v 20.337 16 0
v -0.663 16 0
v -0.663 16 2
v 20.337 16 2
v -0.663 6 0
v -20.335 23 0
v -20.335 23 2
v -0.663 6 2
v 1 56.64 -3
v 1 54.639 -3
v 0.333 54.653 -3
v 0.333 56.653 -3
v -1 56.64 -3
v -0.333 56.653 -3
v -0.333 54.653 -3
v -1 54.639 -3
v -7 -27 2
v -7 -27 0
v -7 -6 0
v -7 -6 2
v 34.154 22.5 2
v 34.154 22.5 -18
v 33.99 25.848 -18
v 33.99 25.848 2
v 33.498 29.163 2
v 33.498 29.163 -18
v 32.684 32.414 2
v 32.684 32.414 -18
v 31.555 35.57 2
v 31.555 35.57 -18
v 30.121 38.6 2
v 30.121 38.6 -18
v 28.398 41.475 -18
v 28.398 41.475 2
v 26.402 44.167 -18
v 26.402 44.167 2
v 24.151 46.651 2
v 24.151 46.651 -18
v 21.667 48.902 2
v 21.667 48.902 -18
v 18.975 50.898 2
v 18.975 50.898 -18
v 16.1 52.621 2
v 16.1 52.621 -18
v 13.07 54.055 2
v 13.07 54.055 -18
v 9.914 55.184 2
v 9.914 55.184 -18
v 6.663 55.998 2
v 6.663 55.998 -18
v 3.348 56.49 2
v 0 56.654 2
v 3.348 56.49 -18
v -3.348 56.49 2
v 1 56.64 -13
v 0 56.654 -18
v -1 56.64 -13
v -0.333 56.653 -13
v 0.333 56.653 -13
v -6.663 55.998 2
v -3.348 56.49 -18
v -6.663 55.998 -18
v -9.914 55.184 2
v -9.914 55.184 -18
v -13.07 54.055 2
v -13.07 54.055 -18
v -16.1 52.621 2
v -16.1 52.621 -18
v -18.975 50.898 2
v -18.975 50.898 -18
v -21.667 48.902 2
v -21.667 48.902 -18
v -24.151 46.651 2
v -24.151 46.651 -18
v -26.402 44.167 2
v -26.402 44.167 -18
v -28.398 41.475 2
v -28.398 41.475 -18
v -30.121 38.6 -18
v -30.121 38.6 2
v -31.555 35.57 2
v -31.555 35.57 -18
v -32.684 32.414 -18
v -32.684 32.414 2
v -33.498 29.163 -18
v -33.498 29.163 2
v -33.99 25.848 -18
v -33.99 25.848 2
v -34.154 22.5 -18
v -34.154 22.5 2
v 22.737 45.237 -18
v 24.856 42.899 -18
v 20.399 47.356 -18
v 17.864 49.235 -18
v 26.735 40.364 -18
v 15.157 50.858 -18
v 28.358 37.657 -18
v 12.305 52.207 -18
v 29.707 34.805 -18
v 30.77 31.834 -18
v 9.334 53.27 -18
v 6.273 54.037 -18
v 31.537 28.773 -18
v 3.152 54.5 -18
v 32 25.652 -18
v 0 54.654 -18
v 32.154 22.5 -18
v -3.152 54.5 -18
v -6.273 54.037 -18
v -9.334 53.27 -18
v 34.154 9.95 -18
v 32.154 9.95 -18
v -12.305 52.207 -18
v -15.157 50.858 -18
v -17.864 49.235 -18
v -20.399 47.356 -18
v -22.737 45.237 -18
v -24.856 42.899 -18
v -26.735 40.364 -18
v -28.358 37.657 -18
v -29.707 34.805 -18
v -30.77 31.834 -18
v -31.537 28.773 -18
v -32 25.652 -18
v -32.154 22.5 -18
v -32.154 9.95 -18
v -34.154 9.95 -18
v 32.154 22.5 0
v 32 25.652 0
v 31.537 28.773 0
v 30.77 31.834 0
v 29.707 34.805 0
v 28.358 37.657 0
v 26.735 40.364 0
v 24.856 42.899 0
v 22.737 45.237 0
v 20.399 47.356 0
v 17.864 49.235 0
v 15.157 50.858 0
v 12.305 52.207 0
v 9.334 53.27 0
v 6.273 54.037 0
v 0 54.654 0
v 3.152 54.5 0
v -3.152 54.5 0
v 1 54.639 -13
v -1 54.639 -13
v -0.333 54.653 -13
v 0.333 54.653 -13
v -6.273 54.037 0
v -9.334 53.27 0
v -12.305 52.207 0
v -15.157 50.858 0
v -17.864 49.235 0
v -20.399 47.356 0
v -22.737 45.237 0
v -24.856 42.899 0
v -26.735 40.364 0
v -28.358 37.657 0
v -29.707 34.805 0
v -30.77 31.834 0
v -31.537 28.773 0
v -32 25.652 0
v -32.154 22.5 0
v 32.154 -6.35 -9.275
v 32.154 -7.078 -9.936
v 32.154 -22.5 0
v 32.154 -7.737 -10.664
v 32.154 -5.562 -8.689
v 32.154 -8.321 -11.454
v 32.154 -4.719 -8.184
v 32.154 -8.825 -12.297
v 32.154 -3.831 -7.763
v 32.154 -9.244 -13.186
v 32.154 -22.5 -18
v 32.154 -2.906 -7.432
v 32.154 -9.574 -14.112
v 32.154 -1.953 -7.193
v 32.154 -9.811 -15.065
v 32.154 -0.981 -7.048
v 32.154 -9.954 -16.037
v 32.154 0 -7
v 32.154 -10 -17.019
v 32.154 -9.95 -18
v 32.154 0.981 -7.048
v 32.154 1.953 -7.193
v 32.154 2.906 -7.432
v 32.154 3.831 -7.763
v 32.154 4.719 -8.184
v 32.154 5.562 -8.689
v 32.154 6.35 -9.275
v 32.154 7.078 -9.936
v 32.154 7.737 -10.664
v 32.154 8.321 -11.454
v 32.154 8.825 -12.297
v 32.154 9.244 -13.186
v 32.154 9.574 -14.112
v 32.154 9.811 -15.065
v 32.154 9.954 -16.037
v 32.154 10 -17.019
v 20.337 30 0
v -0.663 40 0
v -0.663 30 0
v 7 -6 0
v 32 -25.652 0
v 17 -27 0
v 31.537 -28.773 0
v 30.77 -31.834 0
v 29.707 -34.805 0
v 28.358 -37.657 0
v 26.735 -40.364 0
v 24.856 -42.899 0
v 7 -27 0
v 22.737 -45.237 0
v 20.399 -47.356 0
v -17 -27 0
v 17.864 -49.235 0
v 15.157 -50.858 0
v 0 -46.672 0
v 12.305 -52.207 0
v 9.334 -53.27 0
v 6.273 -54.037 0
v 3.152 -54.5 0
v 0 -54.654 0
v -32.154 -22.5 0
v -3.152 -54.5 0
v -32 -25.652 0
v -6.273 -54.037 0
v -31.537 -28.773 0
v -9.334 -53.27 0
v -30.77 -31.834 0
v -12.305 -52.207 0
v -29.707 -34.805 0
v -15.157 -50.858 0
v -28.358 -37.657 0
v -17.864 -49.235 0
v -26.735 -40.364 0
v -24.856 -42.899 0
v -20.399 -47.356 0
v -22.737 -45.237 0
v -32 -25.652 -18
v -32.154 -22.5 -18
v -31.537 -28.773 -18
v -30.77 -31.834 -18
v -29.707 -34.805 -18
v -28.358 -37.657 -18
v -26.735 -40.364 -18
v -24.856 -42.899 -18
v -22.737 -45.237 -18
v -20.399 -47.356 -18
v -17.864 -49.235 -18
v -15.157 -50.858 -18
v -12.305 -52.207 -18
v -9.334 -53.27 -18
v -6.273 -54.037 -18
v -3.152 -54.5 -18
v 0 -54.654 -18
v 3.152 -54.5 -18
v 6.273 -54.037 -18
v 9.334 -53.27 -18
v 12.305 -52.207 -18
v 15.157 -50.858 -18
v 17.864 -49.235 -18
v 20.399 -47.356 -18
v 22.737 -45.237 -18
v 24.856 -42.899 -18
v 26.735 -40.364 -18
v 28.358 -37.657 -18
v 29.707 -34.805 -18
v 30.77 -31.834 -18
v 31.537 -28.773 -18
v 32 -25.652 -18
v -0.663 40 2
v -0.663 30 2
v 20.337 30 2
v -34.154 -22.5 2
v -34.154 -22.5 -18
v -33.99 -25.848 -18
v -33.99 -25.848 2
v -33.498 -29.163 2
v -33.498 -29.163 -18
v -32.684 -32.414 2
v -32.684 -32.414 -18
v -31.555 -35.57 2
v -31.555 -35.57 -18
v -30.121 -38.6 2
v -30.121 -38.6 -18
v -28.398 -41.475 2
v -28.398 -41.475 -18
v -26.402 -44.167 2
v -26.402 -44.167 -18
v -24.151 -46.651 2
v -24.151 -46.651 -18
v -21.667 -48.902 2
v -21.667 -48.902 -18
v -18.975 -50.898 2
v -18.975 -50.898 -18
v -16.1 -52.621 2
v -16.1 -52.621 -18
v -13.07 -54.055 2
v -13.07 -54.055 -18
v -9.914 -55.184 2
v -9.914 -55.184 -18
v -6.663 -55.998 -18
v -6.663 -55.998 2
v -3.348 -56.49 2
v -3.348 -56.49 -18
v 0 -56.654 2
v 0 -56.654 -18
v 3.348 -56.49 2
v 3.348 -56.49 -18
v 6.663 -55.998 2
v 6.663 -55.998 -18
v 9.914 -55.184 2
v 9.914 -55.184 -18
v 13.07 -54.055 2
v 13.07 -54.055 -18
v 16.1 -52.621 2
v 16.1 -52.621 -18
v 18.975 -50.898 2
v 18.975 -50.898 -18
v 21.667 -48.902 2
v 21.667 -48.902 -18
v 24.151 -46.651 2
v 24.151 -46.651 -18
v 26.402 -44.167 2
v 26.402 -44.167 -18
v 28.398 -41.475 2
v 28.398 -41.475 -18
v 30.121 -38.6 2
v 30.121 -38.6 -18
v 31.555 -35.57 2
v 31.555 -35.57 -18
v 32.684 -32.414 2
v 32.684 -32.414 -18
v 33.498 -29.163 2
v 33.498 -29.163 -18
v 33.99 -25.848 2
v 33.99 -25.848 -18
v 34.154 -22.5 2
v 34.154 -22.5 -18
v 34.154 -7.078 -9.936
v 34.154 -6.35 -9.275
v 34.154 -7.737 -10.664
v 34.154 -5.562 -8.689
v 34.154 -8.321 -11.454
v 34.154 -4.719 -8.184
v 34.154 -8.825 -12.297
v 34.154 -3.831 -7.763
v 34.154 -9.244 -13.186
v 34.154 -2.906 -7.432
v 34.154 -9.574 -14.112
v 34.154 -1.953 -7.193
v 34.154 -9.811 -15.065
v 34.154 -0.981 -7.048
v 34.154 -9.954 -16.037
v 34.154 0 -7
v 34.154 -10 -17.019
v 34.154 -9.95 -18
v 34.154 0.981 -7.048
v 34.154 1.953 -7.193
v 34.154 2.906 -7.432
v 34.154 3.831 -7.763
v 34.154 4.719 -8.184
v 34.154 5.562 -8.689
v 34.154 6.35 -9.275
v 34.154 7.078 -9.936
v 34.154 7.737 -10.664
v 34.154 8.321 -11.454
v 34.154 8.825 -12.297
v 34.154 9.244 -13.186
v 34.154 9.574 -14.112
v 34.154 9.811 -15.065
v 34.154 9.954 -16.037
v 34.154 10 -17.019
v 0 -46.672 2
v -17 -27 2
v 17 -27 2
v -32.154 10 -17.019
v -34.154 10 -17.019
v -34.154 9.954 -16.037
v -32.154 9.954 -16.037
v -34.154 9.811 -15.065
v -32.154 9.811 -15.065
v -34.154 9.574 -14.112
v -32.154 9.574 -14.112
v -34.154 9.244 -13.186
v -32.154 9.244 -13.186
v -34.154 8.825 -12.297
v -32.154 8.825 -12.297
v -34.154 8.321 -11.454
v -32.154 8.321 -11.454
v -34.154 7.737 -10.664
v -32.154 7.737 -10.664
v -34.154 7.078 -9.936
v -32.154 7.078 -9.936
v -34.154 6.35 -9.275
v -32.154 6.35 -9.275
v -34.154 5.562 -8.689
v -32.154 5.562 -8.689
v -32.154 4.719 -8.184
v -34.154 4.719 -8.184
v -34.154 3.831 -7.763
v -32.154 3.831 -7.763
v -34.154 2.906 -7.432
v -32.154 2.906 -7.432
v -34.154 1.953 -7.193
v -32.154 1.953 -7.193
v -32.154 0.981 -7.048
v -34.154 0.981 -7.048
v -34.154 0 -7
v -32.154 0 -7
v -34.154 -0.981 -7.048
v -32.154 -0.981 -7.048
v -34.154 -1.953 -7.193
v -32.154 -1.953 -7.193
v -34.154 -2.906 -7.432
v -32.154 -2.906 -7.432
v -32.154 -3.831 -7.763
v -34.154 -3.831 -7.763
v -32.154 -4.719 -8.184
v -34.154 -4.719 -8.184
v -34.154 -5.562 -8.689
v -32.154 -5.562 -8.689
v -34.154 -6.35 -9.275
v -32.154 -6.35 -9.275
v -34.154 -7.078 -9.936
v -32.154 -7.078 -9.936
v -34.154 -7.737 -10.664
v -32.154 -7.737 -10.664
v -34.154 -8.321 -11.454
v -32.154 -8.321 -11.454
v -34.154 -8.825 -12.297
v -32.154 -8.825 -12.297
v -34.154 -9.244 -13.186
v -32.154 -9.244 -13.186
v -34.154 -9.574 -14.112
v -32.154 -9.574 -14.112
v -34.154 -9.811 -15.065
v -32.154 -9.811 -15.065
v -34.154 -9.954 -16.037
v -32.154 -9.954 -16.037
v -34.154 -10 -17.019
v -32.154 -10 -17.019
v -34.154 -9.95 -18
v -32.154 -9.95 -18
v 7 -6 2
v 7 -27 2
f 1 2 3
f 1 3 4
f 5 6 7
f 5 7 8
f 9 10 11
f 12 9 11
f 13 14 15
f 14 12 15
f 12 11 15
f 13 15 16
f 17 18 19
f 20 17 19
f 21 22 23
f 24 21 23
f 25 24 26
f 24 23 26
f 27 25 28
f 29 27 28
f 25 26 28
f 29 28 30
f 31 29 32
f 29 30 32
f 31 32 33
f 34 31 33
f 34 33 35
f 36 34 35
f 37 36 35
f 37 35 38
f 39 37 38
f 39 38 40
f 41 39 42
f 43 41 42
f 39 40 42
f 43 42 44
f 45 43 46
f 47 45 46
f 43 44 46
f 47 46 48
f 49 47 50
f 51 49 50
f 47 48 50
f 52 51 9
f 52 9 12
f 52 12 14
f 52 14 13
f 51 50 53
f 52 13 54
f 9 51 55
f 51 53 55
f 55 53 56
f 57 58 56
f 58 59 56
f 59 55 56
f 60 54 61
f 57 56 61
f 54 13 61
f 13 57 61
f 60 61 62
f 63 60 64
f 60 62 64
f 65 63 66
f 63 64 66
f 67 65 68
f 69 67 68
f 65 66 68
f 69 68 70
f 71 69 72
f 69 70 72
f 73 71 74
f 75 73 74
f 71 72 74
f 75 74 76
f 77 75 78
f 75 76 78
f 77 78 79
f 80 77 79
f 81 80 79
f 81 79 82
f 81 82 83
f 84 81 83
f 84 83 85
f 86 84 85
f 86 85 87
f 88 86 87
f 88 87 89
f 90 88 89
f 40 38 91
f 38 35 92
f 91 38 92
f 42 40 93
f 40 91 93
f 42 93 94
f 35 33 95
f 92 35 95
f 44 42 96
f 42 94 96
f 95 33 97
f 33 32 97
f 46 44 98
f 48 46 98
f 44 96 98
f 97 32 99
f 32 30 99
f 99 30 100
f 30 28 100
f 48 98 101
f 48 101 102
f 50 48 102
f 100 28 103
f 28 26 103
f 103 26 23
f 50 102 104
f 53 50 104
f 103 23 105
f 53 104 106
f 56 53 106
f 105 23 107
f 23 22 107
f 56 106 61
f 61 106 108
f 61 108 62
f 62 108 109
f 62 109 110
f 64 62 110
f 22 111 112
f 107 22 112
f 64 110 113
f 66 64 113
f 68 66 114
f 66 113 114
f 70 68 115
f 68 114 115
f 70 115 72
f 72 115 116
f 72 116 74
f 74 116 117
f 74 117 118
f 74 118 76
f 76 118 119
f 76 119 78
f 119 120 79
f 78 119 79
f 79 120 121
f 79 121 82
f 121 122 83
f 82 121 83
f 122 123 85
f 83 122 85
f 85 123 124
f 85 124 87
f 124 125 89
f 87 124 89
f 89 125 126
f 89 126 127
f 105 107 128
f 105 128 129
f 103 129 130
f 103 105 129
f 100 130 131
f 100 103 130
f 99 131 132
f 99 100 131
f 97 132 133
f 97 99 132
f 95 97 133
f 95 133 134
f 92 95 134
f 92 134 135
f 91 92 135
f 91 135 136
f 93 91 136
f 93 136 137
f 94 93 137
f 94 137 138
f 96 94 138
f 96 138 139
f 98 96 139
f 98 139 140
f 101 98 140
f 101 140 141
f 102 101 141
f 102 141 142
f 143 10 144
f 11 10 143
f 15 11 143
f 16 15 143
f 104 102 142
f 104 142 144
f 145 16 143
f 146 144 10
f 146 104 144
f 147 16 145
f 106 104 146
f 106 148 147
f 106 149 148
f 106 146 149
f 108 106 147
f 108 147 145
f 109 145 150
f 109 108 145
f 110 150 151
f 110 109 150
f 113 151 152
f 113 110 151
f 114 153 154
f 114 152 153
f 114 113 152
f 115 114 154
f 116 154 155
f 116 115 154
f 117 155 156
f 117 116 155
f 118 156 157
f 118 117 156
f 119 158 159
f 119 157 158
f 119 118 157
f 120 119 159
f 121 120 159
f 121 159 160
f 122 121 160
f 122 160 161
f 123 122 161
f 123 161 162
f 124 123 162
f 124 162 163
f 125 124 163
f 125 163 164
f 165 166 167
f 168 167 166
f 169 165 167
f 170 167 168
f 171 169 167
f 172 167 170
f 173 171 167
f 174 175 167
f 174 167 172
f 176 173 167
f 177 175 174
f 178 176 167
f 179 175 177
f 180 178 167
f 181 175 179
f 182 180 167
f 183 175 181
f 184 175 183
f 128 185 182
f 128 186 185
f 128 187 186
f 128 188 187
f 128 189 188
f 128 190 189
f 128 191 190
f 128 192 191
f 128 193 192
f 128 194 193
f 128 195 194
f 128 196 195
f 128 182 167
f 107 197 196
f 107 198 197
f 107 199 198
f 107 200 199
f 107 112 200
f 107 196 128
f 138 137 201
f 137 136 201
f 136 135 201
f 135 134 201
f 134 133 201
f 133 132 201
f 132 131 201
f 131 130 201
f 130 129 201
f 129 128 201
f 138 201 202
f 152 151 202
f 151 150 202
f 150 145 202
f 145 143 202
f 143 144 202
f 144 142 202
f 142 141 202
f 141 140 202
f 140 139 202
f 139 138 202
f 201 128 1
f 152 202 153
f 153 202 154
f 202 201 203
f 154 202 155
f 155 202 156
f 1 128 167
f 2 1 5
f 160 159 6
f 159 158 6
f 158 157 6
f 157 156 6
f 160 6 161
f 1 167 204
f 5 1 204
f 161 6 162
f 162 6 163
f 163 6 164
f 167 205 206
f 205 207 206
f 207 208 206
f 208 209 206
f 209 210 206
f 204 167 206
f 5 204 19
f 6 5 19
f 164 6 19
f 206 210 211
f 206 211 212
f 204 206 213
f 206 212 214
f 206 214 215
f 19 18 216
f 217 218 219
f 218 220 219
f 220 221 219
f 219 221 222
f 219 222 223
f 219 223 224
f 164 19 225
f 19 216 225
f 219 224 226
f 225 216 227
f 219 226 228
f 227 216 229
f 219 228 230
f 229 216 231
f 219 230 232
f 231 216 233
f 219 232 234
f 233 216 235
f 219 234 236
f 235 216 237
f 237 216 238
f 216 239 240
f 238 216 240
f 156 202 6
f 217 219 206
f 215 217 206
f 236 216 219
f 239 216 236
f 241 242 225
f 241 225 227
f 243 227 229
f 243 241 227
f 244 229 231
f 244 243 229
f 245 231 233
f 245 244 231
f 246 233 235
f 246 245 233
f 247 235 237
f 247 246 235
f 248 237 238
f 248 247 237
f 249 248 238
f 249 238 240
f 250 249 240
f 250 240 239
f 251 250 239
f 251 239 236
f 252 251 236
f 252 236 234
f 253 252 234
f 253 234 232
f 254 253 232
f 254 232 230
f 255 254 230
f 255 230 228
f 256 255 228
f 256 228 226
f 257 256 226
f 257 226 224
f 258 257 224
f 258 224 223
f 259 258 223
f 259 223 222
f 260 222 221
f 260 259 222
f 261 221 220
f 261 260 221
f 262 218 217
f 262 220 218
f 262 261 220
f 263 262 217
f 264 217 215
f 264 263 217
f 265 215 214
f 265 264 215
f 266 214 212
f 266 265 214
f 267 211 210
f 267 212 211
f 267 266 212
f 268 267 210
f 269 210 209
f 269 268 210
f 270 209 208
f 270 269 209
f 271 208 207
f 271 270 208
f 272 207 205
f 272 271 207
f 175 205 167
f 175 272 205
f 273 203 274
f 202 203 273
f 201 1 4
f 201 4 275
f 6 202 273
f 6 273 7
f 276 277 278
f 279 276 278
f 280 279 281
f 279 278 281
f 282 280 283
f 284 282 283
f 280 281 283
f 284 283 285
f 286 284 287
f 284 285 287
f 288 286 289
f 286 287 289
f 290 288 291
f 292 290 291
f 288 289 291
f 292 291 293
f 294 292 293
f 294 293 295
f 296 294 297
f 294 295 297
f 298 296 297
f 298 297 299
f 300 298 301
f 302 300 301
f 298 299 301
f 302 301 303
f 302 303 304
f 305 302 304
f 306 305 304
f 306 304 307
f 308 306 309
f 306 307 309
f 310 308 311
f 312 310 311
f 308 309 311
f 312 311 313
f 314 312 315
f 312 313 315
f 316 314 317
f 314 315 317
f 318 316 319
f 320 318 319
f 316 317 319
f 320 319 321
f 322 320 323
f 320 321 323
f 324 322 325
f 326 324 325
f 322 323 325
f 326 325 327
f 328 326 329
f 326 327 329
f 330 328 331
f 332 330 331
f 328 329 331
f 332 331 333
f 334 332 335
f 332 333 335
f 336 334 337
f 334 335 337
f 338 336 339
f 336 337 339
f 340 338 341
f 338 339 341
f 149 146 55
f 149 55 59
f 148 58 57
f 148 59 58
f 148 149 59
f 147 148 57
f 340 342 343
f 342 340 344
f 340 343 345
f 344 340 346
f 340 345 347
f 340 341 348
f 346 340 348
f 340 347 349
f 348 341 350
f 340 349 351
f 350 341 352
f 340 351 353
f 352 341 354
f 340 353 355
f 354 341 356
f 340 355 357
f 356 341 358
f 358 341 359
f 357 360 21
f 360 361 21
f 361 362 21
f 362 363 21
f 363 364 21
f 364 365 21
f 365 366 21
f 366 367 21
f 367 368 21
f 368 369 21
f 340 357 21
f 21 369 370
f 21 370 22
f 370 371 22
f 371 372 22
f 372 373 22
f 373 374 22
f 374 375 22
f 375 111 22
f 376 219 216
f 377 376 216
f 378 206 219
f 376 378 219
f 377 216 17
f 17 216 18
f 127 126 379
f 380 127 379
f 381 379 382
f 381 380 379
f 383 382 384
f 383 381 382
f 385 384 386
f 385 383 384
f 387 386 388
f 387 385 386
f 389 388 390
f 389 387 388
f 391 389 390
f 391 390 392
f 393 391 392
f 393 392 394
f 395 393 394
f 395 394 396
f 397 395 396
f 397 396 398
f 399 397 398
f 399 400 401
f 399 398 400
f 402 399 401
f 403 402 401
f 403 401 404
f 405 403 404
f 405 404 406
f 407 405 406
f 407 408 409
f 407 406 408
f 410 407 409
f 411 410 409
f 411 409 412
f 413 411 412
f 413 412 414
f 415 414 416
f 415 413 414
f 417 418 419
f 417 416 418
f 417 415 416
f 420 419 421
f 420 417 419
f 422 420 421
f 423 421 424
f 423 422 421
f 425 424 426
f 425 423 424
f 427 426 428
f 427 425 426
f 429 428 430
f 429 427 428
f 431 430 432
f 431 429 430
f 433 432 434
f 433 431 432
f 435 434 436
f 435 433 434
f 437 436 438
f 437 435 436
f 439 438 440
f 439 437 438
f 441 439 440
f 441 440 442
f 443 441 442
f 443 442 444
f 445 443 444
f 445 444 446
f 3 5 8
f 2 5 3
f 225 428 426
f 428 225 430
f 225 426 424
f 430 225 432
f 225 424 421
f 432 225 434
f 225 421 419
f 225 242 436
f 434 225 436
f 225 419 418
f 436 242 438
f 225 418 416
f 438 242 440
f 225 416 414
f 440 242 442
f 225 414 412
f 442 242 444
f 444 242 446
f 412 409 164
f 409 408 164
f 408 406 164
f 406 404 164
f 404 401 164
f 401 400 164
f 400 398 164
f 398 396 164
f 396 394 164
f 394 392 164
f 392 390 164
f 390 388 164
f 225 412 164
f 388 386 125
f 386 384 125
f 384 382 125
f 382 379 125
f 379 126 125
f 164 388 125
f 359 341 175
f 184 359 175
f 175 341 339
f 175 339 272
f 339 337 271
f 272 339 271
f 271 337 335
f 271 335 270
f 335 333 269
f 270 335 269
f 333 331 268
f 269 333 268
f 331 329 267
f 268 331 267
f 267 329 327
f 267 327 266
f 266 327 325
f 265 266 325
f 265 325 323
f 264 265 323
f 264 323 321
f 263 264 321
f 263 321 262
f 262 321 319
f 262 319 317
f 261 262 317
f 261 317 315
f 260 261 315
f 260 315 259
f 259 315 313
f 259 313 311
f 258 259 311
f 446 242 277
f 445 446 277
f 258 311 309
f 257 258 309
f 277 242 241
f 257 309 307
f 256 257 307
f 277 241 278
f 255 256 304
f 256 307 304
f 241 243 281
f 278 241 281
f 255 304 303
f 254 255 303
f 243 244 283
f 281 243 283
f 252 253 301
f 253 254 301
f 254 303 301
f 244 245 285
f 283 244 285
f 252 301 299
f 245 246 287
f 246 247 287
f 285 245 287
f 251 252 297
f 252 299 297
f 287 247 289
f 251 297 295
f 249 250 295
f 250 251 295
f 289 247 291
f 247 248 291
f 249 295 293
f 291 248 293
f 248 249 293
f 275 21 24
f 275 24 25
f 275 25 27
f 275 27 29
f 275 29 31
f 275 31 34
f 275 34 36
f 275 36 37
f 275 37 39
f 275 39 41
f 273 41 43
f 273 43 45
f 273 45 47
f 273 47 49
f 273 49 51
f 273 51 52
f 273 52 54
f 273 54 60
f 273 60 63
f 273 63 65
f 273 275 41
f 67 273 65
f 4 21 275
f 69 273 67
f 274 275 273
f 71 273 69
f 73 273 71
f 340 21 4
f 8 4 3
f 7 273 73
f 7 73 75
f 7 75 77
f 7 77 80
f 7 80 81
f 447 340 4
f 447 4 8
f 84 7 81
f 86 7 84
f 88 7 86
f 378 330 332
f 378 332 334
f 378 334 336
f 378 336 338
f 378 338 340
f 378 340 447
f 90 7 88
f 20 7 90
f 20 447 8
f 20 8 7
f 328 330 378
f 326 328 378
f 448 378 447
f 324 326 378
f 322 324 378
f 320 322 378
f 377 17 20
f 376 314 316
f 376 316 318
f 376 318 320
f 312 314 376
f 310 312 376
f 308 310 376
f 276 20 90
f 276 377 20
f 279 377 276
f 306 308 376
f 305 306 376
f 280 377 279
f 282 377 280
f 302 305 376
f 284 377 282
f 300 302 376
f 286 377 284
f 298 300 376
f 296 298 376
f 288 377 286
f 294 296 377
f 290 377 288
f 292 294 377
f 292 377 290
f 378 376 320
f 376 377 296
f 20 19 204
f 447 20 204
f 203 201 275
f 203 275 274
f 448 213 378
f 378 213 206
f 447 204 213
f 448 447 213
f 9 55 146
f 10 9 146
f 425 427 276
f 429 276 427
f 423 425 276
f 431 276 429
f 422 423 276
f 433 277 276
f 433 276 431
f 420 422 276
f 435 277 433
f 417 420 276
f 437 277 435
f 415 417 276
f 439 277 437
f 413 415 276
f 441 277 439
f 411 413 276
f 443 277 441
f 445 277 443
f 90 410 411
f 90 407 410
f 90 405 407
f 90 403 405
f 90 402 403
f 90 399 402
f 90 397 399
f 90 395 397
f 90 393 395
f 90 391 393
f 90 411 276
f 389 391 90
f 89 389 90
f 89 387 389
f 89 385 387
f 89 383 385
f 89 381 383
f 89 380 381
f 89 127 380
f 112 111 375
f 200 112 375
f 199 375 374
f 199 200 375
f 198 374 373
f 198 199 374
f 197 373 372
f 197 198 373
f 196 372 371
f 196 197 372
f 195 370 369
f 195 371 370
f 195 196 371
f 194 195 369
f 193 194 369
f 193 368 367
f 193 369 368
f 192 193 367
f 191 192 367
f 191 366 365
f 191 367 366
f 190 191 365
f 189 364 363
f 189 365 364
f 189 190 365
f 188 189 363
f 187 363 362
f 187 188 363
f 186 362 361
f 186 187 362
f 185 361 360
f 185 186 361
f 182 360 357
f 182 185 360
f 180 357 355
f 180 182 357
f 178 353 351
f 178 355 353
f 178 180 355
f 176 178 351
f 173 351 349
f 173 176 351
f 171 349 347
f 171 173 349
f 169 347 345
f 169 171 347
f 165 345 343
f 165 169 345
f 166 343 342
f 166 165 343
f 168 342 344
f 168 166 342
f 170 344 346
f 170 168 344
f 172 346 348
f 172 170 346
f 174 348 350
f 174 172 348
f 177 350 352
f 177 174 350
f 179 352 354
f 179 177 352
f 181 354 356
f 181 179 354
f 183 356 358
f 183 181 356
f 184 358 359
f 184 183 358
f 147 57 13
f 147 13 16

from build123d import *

# Parameters (mm, degrees)
CYLINDER002_R          = 10
CYLINDER002_DEPTH      = 100
BOX001_W               = 2
BOX001_H               = 10
BOX001_DEPTH           = 10
PAD001_DEPTH           = 2
PAD_DEPTH              = 20
CUT001_PLACEMENT_ANGLE = 180


with BuildPart() as cylinder002:
    # Cylinder002 → Cylinder002 (new body)
    with BuildSketch(Plane(origin=(-48, 0, -17), x_dir=(0, 0, -1), z_dir=(1, 0, 0))):
        Circle(CYLINDER002_R)
    extrude(amount=CYLINDER002_DEPTH)


with BuildPart() as cube001:
    # Box001 → Box001 (new body)
    with BuildSketch(Plane(origin=(-1, -63, -13), x_dir=(1, 0, 0), z_dir=(0, 0, 1))):
        with Locations((1, 5)):
            Rectangle(BOX001_W, BOX001_H)
    extrude(amount=BOX001_DEPTH)


with BuildPart() as body001:
    # Sketch001 → Pad001 (new body)
    with BuildSketch(Plane.XY):
        with BuildLine():
            ThreePointArc((32.166162, 22.5), (0, 54.666162), (-32.166162, 22.5))
            Line((-32.166162, 22.5), (-32.166162, -22.5))
            ThreePointArc((-32.166162, -22.5), (0, -54.666162), (32.166162, -22.5))
            Line((32.166162, 22.5), (32.166162, -22.5))
        make_face()
        Polygon((-17, 27), (0, 46.672316), (17, 27), (7, 27), (7, 6), (-7, 6), (-7, 27), align=None, mode=Mode.SUBTRACT)
        Polygon((-20.337316, -16), (-20.337316, -30), (0.662684, -30), (0.662684, -40), (20.335, -23), (0.662684, -6), (0.662684, -16), align=None, mode=Mode.SUBTRACT)
    extrude(amount=PAD001_DEPTH)


with BuildPart() as f_64_trafficlightcasetop:
    # Sketch → Pad (new body)
    with BuildSketch(Plane.XY):
        with BuildLine():
            ThreePointArc((34.15435, 22.5), (0, 56.65435), (-34.15435, 22.5))
            Line((-34.15435, 22.5), (-34.15435, -22.5))
            ThreePointArc((-34.15435, -22.5), (0, -56.65435), (34.15435, -22.5))
            Line((34.15435, 22.5), (34.15435, -22.5))
        make_face()
        with BuildLine():
            ThreePointArc((32.15435, 22.5), (0, 54.65435), (-32.15435, 22.5))
            Line((-32.15435, 22.5), (-32.15435, -22.5))
            ThreePointArc((-32.15435, -22.5), (0, -54.65435), (32.15435, -22.5))
            Line((32.15435, 22.5), (32.15435, -22.5))
        make_face(mode=Mode.SUBTRACT)
    extrude(amount=PAD_DEPTH)


with BuildPart() as f_64_trafficlightcasetop_1:
    # Body placement: moved
    add(f_64_trafficlightcasetop.part.moved(Location((0, 0, -18))))

    # Fusion: union Body001
    add(body001.part)

    # Cut001: cut Cube001
    add(cube001.part, mode=Mode.SUBTRACT)


with BuildPart() as f_64_trafficlightcasetop_2:
    # Cut001 placement: moved
    add(f_64_trafficlightcasetop_1.part.rotate(Axis((0, 0, 0), (0, 0, 1)), CUT001_PLACEMENT_ANGLE))

    # Cut004: cut Cylinder002
    add(cylinder002.part, mode=Mode.SUBTRACT)


solid = f_64_trafficlightcasetop_2.part
